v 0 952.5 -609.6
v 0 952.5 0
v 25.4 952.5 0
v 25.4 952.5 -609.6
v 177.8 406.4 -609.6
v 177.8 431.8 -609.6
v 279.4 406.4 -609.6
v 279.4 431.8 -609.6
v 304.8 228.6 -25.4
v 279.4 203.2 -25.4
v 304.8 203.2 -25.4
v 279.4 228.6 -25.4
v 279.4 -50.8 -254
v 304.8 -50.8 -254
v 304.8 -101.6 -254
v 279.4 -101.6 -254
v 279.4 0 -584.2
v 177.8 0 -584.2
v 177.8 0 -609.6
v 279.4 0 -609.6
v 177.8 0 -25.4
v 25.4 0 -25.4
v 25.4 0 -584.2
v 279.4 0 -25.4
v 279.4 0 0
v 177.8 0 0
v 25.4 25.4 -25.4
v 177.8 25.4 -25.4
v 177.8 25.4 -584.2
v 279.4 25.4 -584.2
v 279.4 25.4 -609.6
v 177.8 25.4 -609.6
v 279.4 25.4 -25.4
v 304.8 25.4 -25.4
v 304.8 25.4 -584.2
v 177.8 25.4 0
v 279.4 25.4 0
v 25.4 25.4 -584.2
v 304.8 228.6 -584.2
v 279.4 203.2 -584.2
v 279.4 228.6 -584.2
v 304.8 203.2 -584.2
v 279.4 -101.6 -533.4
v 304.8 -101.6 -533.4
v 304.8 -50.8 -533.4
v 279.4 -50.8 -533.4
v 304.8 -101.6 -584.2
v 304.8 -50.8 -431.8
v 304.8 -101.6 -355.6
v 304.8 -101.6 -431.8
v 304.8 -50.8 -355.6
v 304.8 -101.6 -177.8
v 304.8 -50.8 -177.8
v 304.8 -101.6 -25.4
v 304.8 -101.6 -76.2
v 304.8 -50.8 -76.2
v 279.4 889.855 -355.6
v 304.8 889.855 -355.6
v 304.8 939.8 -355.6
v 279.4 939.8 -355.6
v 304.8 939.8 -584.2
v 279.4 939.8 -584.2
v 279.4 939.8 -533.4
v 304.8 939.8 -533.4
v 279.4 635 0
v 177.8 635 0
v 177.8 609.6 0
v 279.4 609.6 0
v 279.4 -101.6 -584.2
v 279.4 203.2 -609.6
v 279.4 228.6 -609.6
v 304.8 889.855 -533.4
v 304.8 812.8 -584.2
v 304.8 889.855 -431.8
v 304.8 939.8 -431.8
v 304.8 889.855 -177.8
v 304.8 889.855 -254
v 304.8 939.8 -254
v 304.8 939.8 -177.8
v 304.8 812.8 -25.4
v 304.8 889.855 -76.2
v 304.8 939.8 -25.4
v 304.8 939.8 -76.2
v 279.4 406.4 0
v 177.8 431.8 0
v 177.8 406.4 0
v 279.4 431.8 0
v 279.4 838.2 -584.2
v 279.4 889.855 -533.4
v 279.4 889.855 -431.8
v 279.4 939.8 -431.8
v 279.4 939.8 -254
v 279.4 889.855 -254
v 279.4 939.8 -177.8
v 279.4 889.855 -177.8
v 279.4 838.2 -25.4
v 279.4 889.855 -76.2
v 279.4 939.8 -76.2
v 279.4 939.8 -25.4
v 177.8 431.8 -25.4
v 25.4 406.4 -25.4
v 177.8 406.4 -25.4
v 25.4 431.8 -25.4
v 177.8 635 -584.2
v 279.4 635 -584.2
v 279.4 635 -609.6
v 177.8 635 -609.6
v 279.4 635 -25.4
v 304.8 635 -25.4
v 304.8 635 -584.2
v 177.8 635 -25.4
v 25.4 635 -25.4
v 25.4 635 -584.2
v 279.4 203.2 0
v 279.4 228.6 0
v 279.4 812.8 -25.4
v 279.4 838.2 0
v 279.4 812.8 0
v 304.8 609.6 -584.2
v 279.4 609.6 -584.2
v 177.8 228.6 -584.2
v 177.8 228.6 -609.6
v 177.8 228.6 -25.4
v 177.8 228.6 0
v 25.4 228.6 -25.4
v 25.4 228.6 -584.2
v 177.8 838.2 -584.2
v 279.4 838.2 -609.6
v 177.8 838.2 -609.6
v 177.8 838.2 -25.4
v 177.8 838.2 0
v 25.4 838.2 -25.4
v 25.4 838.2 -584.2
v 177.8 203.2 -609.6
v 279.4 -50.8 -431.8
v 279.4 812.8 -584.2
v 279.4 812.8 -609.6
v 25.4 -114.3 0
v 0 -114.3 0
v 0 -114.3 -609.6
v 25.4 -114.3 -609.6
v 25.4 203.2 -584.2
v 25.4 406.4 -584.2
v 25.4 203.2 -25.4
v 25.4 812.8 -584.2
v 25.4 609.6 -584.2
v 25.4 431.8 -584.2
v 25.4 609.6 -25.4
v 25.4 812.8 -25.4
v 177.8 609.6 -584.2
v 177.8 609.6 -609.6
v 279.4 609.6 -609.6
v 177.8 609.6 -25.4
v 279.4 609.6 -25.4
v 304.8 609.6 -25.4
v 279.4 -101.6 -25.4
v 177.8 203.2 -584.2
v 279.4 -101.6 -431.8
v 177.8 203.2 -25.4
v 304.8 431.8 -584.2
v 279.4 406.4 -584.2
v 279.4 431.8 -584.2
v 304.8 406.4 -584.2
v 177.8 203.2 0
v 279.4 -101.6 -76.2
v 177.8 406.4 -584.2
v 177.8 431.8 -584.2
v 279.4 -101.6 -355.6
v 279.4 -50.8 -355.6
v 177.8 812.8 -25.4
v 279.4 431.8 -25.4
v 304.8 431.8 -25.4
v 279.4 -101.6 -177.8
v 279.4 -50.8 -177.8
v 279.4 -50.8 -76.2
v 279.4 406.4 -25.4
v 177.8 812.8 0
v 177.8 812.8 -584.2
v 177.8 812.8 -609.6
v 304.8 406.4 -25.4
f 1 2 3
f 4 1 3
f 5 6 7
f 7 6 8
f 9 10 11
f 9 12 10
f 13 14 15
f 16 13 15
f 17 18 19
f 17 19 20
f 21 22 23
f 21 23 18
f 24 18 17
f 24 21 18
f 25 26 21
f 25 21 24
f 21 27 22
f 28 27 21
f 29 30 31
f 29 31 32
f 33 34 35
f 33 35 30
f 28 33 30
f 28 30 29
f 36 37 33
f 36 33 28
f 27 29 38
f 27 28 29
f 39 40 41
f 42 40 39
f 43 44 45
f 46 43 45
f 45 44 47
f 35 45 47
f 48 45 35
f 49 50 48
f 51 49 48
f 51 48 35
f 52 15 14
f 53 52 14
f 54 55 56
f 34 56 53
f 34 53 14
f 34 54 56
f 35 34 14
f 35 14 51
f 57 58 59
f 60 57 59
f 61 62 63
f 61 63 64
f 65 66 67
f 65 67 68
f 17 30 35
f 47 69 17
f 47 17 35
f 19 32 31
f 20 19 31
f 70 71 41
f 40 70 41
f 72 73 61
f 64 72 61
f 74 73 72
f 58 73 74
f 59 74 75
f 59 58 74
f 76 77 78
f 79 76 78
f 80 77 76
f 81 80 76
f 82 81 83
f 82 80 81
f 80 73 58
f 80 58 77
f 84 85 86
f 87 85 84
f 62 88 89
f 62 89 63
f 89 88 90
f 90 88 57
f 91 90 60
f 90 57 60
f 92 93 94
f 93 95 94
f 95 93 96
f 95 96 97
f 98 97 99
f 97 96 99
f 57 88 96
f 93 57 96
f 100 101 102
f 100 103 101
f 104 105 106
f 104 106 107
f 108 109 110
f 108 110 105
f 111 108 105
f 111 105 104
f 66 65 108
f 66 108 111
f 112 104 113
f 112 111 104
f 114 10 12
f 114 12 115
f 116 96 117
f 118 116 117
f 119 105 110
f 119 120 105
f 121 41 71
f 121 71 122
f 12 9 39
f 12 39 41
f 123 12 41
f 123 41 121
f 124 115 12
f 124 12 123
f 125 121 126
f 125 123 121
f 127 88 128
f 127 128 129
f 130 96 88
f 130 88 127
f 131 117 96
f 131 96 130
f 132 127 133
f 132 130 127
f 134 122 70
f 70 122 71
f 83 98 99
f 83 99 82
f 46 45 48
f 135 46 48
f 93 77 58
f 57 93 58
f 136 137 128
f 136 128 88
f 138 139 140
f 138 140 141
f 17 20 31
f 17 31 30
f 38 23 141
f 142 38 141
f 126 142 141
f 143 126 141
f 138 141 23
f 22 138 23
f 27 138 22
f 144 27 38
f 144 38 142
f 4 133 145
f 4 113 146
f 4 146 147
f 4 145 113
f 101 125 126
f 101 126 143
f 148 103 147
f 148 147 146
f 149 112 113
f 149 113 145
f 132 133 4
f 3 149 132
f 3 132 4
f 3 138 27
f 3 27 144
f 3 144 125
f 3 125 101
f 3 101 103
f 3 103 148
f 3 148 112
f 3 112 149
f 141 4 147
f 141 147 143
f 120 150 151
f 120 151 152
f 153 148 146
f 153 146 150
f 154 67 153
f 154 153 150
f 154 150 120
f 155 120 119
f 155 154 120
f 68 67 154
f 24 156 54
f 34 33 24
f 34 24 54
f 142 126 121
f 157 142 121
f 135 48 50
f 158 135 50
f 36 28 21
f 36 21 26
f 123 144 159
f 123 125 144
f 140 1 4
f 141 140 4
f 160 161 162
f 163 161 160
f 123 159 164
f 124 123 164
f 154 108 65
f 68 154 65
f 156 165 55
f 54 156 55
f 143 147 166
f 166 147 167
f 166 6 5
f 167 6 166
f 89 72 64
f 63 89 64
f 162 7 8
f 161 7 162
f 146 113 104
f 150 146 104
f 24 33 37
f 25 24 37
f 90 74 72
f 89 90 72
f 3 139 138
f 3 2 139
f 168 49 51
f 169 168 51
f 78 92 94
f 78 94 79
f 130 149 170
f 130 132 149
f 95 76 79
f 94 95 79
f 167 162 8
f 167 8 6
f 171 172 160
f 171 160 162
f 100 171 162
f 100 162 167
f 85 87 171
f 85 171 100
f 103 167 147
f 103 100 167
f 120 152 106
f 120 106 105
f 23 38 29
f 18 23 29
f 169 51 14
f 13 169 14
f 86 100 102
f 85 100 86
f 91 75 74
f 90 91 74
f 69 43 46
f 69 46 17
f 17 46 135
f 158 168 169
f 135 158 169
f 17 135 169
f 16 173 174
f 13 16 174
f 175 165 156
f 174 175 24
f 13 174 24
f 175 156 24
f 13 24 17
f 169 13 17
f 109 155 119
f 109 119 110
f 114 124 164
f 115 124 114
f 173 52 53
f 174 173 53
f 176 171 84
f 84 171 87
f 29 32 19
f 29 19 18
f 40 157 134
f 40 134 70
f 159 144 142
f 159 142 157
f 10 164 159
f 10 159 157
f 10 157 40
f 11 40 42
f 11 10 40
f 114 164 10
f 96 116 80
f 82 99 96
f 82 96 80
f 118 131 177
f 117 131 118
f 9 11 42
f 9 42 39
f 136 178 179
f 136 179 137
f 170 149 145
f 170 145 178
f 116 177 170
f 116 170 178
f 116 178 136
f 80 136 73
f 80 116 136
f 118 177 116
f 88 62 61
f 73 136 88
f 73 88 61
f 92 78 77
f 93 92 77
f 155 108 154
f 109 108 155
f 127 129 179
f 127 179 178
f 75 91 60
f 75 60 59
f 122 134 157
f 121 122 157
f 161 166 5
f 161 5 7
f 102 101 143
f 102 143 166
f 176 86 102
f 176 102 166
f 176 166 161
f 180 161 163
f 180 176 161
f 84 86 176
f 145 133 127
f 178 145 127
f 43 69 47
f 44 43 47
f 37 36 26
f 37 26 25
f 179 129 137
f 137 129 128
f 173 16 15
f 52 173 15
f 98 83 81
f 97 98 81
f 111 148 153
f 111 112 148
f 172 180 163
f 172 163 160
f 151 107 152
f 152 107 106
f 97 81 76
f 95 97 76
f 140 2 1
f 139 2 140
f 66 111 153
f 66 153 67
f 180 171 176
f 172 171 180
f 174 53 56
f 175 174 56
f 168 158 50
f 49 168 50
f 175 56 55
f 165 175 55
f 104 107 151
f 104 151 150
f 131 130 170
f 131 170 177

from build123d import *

# Parameters (mm, degrees)
F1_DEPTH = 609.6
F2_W     = 25.4
F2_H     = 101.6
F2_H_2   = 114.3
F3_DEPTH = 609.6
F4_W     = 152.4
F4_H     = 25.4
F4_W_2   = 25.4
F5_DEPTH = 1016
F7_DEPTH = 25.4
F8_DEPTH = 25.4


with BuildPart() as f1:
    # F0 (on Top) → F1 (new body)
    with BuildSketch(Plane.XY):
        Polygon((304.8, 838.2), (0, 838.2), (0, 419.1), (0, 0), (304.8, 0), (304.8, 25.4), (25.4, 25.4), (25.4, 203.2), (304.8, 203.2), (304.8, 215.9), (304.8, 228.6), (25.4, 228.6), (25.4, 406.4), (304.8, 406.4), (304.8, 419.1), (304.8, 431.8), (25.4, 431.8), (25.4, 609.6), (304.8, 609.6), (304.8, 622.3), (304.8, 635), (25.4, 635), (25.4, 812.8), (304.8, 812.8), align=None)
    extrude(amount=-F1_DEPTH)

    # F2 (on face) → F3 (join)
    with BuildSketch(Plane.XY):
        with Locations((292.1, 889)):
            Rectangle(F2_W, F2_H)
        with Locations((12.7, 895.35)):
            Rectangle(F2_W, F2_H_2)
        with Locations((12.7, -57.15)):
            Rectangle(F2_W, F2_H_2)
        with Locations((292.1, -50.8)):
            Rectangle(F2_W, F2_H)
    extrude(amount=-F3_DEPTH)

    # F4 (on Front) → F5 (cut, symmetric)
    with BuildSketch(Plane.XZ):
        with Locations((101.6, -12.7)):
            Rectangle(F4_W, F4_H)
        with Locations((292.1, -12.7)):
            Rectangle(F4_W_2, F4_H)
        with Locations((101.6, -596.9)):
            Rectangle(F4_W, F4_H)
        with Locations((292.1, -596.9)):
            Rectangle(F4_W_2, F4_H)
    extrude(amount=F5_DEPTH, both=True, mode=Mode.SUBTRACT)

    # F6 (on face) → F7 (cut, through all)
    with BuildSketch(Plane.YZ.offset(304.8)):
        Polygon((-101.6, -254), (-101.6, -304.8), (-101.6, -355.6), (-50.8, -355.6), (-50.8, -304.8), (-50.8, -254), align=None)
        Polygon((-50.8, -127), (-50.8, -76.2), (-101.6, -76.2), (-101.6, -127), (-101.6, -177.8), (-50.8, -177.8), align=None)
        Polygon((-101.6, -533.4), (-50.8, -533.4), (-50.8, -482.6), (-50.8, -431.8), (-101.6, -431.8), (-101.6, -482.6), align=None)
        Polygon((889.8554785728, -355.6), (940.6554785728, -355.6), (940.6554785728, -304.8), (940.6554785728, -254), (889.8554785728, -254), (889.8554785728, -304.8), align=None)
        Polygon((940.6554785728, -533.4), (940.6554785728, -482.6), (940.6554785728, -431.8), (889.8554785728, -431.8), (889.8554785728, -482.6), (889.8554785728, -533.4), align=None)
        Polygon((889.8554785728, -177.8), (940.6554785728, -177.8), (940.6554785728, -127), (940.6554785728, -76.2), (889.8554785728, -76.2), (889.8554785728, -127), align=None)
    extrude(amount=-F7_DEPTH, mode=Mode.SUBTRACT)

    # F6 (on face) → F8 (cut)
    with BuildSketch(Plane.YZ.offset(304.8)):
        Polygon((-101.6, -254), (-101.6, -304.8), (-101.6, -355.6), (-50.8, -355.6), (-50.8, -304.8), (-50.8, -254), align=None)
        Polygon((-50.8, -127), (-50.8, -76.2), (-101.6, -76.2), (-101.6, -127), (-101.6, -177.8), (-50.8, -177.8), align=None)
        Polygon((-101.6, -533.4), (-50.8, -533.4), (-50.8, -482.6), (-50.8, -431.8), (-101.6, -431.8), (-101.6, -482.6), align=None)
        Polygon((889.8554785728, -355.6), (940.6554785728, -355.6), (940.6554785728, -304.8), (940.6554785728, -254), (889.8554785728, -254), (889.8554785728, -304.8), align=None)
        Polygon((940.6554785728, -533.4), (940.6554785728, -482.6), (940.6554785728, -431.8), (889.8554785728, -431.8), (889.8554785728, -482.6), (889.8554785728, -533.4), align=None)
        Polygon((889.8554785728, -177.8), (940.6554785728, -177.8), (940.6554785728, -127), (940.6554785728, -76.2), (889.8554785728, -76.2), (889.8554785728, -127), align=None)
    extrude(amount=-F8_DEPTH, mode=Mode.SUBTRACT)


solid = f1.part
